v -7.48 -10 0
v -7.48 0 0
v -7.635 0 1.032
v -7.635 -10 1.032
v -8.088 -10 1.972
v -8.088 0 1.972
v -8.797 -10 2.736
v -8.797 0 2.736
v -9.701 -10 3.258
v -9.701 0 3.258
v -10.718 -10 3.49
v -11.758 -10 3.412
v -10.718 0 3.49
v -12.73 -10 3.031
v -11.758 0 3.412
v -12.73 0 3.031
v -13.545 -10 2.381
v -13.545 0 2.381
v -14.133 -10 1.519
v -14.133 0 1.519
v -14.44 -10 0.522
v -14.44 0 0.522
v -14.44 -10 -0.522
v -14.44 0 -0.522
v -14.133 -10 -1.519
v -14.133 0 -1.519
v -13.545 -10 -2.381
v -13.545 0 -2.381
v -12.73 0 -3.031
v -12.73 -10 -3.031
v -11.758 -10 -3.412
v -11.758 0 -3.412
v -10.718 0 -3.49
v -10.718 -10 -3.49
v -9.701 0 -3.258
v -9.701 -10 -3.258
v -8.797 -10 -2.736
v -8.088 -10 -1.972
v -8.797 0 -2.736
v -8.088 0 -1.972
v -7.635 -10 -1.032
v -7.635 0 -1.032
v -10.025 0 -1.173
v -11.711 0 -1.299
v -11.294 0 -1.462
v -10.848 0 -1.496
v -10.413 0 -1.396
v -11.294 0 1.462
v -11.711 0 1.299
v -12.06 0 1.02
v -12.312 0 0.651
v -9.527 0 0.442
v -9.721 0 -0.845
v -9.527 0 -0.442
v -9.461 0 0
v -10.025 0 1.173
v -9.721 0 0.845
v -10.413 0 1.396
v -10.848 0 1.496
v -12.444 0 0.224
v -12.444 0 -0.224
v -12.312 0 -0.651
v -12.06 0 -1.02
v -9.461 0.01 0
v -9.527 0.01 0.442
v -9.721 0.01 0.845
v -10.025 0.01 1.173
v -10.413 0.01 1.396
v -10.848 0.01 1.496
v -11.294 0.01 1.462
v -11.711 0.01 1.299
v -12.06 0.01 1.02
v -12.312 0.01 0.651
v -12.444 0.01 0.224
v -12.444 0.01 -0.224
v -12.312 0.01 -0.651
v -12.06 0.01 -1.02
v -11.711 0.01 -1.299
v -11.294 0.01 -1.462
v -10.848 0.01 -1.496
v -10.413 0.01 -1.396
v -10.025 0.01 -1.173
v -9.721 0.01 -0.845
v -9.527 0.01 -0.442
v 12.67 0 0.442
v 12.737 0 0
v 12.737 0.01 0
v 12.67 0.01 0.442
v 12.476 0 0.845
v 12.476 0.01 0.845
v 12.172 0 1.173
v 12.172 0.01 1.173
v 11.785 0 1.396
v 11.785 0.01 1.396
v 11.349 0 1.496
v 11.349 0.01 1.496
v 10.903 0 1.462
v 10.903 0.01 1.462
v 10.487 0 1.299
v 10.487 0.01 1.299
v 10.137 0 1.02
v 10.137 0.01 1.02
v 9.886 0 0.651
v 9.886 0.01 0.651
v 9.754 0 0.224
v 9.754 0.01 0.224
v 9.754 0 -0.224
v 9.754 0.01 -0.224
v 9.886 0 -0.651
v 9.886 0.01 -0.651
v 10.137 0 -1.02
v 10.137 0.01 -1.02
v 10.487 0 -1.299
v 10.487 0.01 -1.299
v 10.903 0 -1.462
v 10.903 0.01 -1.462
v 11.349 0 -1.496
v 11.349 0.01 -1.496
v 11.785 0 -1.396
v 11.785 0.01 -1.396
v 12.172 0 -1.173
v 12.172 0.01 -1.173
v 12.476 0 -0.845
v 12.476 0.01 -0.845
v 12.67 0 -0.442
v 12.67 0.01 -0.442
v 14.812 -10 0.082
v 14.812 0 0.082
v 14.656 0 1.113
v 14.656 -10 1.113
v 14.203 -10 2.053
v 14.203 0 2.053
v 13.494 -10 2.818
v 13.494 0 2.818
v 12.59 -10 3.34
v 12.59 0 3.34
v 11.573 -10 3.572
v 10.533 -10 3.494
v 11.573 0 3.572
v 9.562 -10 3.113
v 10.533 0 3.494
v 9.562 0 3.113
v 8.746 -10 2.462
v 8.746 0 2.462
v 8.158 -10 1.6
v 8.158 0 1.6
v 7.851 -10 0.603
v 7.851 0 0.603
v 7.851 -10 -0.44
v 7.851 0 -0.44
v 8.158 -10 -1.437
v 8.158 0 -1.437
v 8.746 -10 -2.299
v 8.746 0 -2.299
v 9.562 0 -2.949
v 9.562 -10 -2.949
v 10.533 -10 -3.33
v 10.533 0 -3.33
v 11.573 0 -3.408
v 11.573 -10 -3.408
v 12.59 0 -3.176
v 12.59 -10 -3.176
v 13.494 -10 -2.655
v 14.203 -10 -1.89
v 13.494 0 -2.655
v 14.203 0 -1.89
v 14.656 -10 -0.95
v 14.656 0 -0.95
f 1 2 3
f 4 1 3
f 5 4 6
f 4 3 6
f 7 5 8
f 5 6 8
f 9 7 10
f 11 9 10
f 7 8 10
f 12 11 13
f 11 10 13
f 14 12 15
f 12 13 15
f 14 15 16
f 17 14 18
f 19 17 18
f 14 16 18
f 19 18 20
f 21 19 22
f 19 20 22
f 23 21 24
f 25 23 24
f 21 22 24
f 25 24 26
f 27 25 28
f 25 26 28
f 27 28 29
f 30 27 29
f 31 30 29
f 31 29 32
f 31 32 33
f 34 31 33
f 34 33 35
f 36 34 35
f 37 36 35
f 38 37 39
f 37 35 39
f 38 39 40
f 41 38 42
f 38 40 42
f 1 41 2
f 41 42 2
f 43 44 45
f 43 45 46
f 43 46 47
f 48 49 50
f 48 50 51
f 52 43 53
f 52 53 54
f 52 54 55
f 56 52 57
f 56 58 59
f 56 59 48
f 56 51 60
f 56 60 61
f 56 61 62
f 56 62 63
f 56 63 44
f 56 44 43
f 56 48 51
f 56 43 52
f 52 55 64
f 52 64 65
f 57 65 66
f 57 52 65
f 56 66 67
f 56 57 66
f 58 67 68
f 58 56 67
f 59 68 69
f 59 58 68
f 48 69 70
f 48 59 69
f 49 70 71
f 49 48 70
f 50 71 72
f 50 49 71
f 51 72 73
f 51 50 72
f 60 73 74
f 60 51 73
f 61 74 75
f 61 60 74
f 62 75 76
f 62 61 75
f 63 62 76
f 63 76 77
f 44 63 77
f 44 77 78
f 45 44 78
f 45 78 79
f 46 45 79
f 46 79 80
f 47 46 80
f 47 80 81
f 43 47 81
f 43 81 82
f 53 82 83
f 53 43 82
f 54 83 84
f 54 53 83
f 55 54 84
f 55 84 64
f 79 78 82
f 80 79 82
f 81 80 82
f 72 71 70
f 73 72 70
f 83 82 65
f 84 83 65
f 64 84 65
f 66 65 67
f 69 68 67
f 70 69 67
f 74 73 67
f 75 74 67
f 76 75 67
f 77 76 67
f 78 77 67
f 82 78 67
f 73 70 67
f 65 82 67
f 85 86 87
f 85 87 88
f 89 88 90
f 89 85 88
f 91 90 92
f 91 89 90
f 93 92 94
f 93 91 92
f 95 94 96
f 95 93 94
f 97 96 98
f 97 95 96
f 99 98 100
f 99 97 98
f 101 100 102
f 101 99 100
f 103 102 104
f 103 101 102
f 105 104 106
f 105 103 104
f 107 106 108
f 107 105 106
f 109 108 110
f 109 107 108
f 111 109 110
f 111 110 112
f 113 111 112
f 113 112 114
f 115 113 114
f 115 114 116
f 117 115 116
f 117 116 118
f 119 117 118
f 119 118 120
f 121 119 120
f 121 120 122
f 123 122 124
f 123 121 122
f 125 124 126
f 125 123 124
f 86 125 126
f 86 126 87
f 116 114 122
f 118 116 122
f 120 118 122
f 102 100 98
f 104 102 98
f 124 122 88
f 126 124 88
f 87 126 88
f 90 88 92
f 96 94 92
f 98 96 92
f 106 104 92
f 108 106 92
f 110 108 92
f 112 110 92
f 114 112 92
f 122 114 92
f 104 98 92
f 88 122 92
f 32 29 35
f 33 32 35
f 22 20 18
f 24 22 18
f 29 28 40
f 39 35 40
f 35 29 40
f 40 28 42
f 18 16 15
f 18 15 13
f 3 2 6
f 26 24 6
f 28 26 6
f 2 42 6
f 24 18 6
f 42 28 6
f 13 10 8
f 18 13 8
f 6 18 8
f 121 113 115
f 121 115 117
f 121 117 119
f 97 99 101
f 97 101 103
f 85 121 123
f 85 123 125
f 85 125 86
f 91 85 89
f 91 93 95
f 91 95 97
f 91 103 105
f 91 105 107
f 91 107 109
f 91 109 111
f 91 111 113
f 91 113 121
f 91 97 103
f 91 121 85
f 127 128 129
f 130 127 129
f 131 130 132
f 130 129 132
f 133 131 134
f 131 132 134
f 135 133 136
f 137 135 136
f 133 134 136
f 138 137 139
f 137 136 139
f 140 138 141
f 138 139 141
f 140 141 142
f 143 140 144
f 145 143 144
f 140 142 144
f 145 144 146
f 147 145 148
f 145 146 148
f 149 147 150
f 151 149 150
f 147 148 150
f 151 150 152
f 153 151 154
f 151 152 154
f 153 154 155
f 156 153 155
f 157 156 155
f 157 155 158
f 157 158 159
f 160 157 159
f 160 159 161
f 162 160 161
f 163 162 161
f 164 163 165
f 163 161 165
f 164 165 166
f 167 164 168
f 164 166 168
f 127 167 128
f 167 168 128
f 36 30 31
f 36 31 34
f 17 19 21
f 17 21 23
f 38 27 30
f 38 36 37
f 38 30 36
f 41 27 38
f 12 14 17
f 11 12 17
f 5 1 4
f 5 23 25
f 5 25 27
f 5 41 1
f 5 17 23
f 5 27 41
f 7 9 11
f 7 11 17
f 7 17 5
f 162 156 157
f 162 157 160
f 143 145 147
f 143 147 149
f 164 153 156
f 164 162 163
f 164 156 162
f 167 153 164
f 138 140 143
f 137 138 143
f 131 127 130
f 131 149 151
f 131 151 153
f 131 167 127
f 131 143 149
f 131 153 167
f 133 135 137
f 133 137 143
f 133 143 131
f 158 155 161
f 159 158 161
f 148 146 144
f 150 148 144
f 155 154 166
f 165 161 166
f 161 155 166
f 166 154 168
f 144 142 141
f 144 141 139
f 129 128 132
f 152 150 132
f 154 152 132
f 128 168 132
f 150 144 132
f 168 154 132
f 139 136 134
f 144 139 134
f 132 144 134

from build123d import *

# Parameters (mm, degrees)
F0_R     = 3.5
F1_DEPTH = 10
F2_R     = 1.5
F3_DEPTH = 0.01


with BuildPart() as f1:
    # F0 (on Front) → F1 (new body)
    with BuildSketch(Plane.XZ):
        with Locations((-10.979567, 0)):
            Circle(F0_R)
        with Locations((11.311573, 0.081834)):
            Circle(F0_R)
    extrude(amount=F1_DEPTH)


with BuildPart() as f3:
    # F2 (on Front) → F3 (new body)
    with BuildSketch(Plane.XZ):
        with Locations((-10.960588, 0)):
            Circle(F2_R)
        with Locations((11.236989, 0)):
            Circle(F2_R)
    extrude(amount=-F3_DEPTH)


solid = Compound([f1.part, f3.part])
